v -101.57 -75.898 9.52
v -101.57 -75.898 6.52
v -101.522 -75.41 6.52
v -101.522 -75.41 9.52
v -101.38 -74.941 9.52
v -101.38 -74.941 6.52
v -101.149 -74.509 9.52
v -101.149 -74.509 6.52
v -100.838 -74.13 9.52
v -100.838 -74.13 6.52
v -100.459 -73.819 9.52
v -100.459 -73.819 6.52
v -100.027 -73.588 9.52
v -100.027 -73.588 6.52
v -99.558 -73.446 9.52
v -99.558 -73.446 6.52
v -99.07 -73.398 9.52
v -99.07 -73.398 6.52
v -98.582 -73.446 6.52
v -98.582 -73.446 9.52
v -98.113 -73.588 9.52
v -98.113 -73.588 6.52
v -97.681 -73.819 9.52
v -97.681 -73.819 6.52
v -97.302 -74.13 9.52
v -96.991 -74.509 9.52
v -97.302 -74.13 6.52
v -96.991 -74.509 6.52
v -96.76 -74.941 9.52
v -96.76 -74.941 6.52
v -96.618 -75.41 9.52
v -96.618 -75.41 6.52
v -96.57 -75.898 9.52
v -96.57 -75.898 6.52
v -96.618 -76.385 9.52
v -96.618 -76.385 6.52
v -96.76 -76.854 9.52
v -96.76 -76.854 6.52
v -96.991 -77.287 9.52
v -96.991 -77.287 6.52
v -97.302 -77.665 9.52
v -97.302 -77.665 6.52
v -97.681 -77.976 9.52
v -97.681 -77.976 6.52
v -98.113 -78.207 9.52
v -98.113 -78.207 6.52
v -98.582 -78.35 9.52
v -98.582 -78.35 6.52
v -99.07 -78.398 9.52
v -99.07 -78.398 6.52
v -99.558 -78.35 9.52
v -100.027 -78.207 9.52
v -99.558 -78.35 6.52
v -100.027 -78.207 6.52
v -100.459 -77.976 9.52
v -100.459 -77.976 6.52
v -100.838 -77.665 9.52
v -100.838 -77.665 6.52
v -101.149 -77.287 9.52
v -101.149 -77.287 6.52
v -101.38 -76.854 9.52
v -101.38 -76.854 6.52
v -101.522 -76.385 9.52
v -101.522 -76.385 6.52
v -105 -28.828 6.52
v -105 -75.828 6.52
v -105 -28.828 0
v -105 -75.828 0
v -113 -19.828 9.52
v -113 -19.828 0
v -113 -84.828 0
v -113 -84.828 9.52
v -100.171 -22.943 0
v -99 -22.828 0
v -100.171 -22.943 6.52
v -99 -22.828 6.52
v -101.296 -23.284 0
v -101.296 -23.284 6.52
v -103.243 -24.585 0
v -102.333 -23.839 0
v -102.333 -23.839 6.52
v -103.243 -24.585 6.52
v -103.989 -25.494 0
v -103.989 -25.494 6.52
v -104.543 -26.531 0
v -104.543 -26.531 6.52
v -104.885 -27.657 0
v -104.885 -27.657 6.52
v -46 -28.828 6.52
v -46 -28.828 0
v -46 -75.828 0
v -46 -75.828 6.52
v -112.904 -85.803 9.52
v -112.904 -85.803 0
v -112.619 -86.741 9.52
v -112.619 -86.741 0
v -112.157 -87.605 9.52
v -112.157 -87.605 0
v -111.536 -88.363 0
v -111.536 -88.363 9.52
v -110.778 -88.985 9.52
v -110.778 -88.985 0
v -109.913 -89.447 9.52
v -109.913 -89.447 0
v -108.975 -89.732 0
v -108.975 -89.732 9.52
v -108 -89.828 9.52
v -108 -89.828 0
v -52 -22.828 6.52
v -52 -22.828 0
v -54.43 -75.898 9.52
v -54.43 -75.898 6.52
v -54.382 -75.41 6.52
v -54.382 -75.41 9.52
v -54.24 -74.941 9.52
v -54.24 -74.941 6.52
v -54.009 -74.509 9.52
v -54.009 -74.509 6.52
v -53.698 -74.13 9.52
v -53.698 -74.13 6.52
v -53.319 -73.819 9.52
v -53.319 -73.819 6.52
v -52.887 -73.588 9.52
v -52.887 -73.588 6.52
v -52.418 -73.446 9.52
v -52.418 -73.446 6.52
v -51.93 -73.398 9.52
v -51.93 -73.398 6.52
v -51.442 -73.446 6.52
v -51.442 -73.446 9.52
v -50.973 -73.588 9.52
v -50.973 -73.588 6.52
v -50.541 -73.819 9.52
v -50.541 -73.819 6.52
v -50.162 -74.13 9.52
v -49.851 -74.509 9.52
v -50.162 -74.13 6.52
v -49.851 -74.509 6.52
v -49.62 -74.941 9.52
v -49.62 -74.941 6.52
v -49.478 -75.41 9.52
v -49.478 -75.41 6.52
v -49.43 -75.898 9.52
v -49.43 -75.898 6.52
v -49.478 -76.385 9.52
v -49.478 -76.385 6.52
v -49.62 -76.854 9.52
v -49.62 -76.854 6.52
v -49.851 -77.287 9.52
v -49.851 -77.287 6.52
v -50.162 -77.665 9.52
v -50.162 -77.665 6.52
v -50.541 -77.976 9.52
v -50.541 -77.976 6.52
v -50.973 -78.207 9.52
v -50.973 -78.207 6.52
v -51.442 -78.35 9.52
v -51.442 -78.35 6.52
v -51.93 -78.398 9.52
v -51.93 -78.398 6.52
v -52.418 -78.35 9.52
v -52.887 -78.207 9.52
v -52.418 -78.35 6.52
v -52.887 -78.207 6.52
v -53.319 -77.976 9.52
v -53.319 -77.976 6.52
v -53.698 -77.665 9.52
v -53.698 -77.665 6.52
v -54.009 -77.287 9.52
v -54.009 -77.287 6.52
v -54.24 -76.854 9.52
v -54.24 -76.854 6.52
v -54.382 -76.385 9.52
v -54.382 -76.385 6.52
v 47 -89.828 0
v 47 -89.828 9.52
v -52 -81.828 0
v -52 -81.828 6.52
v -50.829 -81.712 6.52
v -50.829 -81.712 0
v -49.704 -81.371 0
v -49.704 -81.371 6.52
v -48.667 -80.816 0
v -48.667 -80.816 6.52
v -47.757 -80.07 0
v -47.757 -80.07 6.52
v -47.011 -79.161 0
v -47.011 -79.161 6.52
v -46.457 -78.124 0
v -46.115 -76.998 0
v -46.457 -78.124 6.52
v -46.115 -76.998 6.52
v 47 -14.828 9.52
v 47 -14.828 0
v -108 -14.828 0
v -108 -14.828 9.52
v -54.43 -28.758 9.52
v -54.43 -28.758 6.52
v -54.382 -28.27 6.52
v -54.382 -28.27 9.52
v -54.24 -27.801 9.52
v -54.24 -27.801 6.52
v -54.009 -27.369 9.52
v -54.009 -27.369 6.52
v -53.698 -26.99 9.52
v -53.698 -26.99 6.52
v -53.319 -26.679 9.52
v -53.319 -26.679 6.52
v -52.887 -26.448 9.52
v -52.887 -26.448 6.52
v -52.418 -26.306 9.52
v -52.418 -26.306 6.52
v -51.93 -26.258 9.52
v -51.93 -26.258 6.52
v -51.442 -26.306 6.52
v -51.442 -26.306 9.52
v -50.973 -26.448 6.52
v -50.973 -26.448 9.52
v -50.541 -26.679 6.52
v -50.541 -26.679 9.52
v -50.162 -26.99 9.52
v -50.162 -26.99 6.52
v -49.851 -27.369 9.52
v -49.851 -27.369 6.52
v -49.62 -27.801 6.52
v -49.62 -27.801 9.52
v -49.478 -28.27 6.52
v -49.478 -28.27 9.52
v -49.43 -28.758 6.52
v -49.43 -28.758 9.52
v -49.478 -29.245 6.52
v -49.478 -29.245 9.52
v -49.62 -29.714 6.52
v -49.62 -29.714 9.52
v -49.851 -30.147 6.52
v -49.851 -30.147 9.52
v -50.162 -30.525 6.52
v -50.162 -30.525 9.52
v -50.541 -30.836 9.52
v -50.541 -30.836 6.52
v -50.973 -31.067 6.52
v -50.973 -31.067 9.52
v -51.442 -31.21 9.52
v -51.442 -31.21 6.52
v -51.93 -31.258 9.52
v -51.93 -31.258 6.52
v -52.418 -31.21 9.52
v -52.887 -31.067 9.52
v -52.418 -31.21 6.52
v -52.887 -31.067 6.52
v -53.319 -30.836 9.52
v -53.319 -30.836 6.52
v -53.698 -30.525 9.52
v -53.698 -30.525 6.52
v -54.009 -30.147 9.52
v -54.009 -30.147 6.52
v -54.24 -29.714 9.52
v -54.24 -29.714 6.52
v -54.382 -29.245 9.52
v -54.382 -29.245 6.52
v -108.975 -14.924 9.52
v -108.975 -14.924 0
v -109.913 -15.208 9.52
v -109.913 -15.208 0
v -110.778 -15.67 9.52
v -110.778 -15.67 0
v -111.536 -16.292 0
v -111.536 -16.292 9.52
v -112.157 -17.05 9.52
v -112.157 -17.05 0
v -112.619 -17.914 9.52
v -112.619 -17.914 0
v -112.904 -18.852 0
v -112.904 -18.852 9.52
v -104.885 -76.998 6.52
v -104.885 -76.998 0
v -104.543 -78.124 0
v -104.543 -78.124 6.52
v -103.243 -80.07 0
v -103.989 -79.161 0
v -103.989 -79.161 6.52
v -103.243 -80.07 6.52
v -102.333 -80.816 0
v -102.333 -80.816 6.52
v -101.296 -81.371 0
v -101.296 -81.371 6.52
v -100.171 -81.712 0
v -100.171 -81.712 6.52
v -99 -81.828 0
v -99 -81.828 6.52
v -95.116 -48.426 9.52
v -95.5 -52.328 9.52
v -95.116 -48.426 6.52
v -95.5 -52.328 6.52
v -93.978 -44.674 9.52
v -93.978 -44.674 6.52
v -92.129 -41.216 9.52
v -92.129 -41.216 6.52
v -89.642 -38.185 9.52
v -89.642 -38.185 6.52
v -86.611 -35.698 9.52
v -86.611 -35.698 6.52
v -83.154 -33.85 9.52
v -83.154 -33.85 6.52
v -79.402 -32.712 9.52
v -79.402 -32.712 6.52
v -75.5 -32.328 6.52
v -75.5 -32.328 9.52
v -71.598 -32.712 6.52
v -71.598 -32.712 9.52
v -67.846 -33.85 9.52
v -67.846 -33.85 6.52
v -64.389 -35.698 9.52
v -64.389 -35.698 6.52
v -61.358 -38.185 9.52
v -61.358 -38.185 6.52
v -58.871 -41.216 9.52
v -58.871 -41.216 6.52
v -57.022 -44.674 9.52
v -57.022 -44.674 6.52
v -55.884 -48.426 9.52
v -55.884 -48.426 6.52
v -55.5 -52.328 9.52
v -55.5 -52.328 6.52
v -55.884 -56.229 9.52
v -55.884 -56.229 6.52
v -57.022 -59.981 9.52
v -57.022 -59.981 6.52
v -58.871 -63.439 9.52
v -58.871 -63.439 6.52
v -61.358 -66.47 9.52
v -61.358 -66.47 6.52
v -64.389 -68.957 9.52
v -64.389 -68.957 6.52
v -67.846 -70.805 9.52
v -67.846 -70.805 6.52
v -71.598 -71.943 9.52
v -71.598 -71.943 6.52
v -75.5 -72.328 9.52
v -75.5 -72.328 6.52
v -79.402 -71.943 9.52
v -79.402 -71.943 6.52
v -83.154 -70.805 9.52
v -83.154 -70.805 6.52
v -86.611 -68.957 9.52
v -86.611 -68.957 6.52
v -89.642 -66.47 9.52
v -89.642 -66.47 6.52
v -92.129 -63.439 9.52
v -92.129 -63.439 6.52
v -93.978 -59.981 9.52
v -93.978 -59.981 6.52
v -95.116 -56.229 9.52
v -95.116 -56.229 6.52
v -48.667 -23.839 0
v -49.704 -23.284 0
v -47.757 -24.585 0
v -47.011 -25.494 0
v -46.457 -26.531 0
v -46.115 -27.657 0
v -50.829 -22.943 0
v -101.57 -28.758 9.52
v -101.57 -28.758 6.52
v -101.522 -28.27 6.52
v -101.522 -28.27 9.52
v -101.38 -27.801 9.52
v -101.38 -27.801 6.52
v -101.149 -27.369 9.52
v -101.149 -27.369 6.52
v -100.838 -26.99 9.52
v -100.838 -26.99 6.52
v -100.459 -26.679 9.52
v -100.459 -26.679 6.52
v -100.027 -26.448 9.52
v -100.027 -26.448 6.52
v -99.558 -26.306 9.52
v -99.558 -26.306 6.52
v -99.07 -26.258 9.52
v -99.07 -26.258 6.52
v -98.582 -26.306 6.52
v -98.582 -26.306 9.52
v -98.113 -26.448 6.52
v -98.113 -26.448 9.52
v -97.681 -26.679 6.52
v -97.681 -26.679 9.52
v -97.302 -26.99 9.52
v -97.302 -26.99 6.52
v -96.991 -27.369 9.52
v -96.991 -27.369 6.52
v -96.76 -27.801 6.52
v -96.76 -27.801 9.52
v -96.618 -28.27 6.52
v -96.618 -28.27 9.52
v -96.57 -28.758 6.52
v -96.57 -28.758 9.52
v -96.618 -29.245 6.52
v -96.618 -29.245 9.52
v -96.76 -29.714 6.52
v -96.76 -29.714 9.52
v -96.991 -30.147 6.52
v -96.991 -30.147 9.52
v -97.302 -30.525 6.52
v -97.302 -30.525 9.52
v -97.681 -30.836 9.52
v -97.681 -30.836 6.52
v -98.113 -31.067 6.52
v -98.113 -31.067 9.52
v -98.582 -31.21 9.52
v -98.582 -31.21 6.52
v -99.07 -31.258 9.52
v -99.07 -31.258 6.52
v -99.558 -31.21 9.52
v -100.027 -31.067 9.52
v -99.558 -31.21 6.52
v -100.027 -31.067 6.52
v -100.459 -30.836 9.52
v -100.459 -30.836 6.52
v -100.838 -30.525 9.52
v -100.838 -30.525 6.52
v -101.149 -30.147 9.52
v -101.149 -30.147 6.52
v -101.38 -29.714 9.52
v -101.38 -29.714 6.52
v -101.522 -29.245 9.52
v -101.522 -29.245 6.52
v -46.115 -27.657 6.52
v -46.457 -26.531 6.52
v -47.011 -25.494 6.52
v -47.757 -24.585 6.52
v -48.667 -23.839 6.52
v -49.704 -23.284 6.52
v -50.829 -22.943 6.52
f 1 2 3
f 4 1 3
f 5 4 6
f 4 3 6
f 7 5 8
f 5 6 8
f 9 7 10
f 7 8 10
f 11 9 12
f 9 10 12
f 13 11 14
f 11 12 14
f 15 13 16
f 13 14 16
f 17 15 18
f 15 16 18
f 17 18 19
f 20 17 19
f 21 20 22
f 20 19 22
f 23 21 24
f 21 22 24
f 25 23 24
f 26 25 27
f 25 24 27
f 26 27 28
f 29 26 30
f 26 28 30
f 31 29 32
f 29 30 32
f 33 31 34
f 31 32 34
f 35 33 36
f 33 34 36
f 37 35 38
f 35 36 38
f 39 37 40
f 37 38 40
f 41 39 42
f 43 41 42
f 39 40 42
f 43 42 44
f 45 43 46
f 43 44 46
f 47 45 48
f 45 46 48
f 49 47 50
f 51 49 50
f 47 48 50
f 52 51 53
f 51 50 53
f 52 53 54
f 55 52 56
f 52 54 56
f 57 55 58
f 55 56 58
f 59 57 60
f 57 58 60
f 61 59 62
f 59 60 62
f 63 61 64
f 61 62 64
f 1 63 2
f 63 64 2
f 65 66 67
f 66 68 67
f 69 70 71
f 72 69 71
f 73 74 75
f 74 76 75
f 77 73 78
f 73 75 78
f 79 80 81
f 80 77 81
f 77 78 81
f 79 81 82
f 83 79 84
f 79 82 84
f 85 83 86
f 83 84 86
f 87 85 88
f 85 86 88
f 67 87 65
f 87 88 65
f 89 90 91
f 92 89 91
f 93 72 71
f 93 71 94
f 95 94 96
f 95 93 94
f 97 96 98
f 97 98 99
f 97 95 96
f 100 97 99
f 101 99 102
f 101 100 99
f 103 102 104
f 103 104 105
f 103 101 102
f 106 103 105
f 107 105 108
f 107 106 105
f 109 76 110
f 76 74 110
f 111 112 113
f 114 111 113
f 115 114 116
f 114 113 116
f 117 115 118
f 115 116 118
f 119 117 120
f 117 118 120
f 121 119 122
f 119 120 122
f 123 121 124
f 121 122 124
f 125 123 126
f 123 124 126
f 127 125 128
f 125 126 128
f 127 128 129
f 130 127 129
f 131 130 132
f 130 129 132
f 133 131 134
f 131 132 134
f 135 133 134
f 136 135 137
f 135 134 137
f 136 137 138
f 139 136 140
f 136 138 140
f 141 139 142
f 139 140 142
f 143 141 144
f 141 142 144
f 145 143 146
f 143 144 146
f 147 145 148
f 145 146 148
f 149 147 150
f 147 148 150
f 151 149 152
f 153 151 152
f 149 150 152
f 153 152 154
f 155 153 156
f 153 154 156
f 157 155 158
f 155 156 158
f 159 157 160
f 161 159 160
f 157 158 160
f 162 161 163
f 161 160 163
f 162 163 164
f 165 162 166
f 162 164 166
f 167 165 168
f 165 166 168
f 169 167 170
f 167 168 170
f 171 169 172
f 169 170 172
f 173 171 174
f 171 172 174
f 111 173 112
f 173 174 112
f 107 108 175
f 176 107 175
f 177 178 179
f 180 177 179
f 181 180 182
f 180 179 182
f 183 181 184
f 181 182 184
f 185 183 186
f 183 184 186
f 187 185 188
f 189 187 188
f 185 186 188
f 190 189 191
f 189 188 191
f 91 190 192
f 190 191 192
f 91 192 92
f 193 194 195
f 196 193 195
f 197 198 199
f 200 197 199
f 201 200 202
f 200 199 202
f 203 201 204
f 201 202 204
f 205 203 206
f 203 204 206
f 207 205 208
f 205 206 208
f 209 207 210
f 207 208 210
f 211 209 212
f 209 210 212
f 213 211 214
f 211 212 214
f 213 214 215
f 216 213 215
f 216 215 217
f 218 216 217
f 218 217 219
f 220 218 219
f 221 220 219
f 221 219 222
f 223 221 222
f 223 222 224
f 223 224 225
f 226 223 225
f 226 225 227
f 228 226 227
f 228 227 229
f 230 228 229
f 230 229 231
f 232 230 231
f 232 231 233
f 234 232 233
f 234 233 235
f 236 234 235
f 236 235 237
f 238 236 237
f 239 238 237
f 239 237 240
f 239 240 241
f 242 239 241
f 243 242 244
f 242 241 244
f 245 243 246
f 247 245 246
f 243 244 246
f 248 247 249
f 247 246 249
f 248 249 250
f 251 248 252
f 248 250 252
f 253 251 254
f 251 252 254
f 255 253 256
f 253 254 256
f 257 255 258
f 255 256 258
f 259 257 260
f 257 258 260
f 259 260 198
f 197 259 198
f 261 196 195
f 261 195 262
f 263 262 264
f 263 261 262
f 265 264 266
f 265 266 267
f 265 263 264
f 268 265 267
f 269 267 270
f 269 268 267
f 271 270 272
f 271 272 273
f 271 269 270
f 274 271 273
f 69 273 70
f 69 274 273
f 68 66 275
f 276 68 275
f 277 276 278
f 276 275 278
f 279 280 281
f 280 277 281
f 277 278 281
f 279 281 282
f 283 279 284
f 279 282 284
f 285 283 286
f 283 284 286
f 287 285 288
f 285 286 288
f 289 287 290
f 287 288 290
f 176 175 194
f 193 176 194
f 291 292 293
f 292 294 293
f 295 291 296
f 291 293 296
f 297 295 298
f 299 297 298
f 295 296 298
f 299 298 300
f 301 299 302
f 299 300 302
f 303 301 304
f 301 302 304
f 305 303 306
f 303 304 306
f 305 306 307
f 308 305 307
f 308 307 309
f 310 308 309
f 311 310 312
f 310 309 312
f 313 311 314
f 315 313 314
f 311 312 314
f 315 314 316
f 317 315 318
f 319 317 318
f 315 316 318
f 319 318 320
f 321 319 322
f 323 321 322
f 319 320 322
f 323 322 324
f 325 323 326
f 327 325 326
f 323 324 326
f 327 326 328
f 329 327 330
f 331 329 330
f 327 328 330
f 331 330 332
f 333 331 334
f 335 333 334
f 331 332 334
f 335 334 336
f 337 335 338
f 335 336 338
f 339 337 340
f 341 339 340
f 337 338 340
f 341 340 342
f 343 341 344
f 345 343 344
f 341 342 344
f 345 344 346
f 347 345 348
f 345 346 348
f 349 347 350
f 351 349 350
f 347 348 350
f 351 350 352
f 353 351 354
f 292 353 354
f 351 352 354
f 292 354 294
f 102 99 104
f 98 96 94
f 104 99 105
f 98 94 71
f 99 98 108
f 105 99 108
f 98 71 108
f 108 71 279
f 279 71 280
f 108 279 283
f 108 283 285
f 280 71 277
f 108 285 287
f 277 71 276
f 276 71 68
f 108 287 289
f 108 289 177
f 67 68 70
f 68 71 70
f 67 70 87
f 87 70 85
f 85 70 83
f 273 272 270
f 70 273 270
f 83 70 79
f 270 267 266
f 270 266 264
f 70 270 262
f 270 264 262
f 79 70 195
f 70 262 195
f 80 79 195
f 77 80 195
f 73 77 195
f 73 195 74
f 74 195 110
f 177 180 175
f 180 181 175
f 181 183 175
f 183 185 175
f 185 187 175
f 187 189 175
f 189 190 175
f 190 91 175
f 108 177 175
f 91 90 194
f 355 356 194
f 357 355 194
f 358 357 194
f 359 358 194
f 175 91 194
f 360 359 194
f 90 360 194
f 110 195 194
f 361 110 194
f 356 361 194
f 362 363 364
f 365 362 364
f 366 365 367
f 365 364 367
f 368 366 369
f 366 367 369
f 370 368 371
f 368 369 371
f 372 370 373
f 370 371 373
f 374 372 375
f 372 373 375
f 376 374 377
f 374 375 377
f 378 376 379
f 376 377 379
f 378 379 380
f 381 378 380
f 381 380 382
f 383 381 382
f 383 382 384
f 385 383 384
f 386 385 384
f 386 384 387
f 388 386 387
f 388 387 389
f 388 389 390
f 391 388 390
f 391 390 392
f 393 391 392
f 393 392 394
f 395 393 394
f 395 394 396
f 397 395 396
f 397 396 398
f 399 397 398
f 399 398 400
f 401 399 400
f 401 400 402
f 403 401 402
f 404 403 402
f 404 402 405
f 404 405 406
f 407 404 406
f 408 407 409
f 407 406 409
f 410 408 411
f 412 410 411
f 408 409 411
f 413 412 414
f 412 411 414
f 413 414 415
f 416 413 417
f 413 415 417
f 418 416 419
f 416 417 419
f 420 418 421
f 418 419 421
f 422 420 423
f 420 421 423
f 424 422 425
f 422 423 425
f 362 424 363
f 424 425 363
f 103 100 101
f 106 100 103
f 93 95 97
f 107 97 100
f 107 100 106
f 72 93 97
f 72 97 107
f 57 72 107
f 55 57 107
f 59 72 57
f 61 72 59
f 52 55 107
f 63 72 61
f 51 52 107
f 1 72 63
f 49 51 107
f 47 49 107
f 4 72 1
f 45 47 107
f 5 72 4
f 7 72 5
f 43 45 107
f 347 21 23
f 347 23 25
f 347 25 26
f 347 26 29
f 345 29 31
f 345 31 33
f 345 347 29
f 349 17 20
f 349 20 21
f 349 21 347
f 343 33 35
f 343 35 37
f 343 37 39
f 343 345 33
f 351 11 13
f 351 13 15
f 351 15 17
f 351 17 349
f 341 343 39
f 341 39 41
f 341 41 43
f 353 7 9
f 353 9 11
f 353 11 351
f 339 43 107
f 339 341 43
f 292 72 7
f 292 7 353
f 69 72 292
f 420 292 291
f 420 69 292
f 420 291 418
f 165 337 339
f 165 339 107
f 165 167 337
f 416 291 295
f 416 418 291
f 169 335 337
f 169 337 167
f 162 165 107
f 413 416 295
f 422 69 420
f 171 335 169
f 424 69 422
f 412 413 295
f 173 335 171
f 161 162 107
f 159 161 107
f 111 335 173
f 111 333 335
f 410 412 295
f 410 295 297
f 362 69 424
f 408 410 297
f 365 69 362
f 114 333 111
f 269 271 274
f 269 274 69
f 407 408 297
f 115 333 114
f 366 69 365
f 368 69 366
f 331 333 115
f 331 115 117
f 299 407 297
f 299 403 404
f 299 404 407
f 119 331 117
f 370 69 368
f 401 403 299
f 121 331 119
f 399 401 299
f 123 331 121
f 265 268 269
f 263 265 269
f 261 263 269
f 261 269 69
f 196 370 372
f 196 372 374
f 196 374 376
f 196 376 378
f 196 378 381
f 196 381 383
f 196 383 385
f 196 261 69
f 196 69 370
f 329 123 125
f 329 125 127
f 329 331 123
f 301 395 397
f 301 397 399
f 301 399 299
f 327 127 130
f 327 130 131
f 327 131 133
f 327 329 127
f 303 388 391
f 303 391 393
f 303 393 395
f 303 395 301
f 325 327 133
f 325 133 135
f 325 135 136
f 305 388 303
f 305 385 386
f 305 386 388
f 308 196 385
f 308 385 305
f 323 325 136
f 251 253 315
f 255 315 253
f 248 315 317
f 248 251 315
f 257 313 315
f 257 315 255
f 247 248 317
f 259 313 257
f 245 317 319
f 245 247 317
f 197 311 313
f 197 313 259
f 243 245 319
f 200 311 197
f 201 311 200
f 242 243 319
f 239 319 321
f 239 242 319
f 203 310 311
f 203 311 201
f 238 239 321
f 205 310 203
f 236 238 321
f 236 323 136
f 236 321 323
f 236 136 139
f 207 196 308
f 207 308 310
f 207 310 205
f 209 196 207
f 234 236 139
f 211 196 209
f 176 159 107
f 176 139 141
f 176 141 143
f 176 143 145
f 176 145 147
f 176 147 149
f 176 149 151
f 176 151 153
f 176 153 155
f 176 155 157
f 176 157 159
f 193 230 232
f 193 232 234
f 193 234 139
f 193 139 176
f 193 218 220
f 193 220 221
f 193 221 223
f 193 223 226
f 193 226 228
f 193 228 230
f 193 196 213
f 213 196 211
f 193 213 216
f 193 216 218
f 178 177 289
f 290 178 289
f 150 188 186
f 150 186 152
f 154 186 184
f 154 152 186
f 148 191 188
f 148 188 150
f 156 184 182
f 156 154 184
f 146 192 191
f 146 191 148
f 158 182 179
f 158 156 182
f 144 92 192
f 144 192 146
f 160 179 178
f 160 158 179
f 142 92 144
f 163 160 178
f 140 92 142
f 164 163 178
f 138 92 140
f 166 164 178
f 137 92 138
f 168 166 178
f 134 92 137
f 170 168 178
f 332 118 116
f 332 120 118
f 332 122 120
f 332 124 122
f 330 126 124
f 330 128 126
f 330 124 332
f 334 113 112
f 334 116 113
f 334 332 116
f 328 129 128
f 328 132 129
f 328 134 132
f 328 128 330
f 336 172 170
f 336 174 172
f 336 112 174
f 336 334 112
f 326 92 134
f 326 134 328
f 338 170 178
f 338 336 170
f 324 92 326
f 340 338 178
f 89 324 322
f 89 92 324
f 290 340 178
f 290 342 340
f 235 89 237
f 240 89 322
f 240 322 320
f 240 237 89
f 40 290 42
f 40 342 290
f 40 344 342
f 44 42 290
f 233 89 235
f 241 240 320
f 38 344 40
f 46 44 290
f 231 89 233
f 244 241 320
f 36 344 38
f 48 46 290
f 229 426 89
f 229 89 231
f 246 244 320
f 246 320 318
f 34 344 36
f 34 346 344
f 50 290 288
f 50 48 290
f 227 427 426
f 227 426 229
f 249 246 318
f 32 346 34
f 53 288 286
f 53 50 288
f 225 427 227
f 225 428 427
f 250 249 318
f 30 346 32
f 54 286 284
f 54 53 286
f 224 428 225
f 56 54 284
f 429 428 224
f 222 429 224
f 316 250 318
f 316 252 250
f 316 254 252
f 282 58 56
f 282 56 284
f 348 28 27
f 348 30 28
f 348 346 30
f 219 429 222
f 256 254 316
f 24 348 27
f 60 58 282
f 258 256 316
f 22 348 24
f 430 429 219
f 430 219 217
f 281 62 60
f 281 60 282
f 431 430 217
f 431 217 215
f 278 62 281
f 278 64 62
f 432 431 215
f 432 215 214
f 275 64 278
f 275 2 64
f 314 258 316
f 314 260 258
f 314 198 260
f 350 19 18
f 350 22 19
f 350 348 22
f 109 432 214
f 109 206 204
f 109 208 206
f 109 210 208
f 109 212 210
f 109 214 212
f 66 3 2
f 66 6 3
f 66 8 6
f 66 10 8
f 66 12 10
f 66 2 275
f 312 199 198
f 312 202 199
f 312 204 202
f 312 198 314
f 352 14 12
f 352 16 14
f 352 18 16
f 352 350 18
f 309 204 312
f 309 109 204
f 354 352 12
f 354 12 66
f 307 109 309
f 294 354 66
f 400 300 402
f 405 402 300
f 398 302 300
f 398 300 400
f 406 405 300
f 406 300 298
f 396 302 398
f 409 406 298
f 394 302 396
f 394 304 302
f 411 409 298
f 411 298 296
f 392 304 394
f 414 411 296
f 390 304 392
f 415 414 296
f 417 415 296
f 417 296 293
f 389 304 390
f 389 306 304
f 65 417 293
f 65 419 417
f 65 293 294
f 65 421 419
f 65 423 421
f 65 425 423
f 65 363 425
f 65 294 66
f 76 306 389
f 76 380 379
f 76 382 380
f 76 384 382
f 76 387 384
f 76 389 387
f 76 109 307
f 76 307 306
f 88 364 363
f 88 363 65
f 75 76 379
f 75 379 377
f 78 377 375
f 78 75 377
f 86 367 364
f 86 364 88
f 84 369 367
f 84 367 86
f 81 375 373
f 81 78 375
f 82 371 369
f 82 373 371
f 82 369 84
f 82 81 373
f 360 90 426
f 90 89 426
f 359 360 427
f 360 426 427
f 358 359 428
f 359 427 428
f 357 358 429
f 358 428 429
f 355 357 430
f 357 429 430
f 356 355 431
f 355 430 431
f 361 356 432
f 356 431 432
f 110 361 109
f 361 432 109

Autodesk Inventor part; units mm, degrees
ref_plane "YZ Plane" through (0, 0, 0) normal (1, 0, 0) x (0, 1, 0)
ref_plane "XZ Plane" through (0, 0, 0) normal (0, 1, 0) x (-1, 0, 0)
ref_plane "XY Plane" through (0, 0, 0) normal (0, 0, 1) x (1, 0, 0)
sketch "Esboço1" plane through (0, 0, 0) normal (0, 0, 1) x (1, 0, 0)
  line L0 (-33, -50) -> (-33, 950) projected
  line L1 (47, -50) -> (47, 950) projected
  line L2 (-113, -89.8276) -> (47, -89.8276)
  line L3 (47, -14.8276) -> (-113, -14.8276)
  line L4 (-113, -14.8276) -> (-113, -89.8276)
  line L5 (47, -89.8276) -> (47, -14.8276)
  point P0 (0, 0)
  dimension "d0" = 160
  dimension "d1" = 160
  dimension "d2" = 75
extrude "Extrusão1" add sketch "Esboço1" along normal blind 9.52
sketch "Esboço9" plane through (0, 0, 0) normal (0, 0, -1) x (-1, 0, 0)
  line L0 (105, -22.8276) -> (46, -22.8276)
  line L1 (46, -22.8276) -> (46, -81.8276)
  line L2 (46, -81.8276) -> (105, -81.8276)
  line L3 (105, -81.8276) -> (105, -22.8276)
  line L4 (105, -22.8276) -> (46, -81.8276) construction
  line L5 (46, -22.8276) -> (105, -81.8276) construction
  line L6 (105, -52.3276) -> (46, -52.3276) construction
  line L7 (75.5, -22.8276) -> (75.5, -81.8276) construction
  circle A0 centre (99.07, -28.7576) radius 2.5
  circle A1 centre (99.07, -75.8976) radius 2.5
  circle A2 centre (51.93, -28.7576) radius 2.5
  circle A3 centre (51.93, -75.8976) radius 2.5
  line L8 (113, -14.8276) -> (113, -89.8276) projected
  line L9 (113, -89.8276) -> (-47, -89.8276) projected
  circle A4 centre (75.5, -52.3276) radius 20
  point P0 (0, 0)
  dimension "d72" = 59
  dimension "d73" = 59
  dimension "d74" = 5
  dimension "d75" = 5
  dimension "d76" = 5
  dimension "d77" = 5
  dimension "d78" = 23.57
  dimension "d79" = 23.57
  dimension "d80" = 23.57
  dimension "d81" = 23.57
  dimension "d82" = 23.57
  dimension "d83" = 23.57
  dimension "d84" = 23.57
  dimension "d85" = 23.57
  dimension "d86" = 8
  dimension "d87" = 8
  dimension "d88" = 40
extrude "Extrusão6" cut sketch "Esboço9" against normal blind 6.52
sketch "Esboço10" plane through (-75.5, -52.3276, 0) normal (0, 0, -1) x (-1, 0, 0)
  circle A0 centre (0, 0) radius 20 projected
  circle A1 centre (0, 0) radius 20
  circle A2 centre (23.57, -23.57) radius 2.5 projected
  circle A3 centre (23.57, -23.57) radius 2.5
  circle A4 centre (23.57, 23.57) radius 2.5 projected
  circle A5 centre (23.57, 23.57) radius 2.5
  circle A6 centre (-23.57, 23.57) radius 2.5 projected
  circle A7 centre (-23.57, 23.57) radius 2.5
  circle A8 centre (-23.57, -23.57) radius 2.5 projected
  circle A9 centre (-23.57, -23.57) radius 2.5
  point P0 (-75.5, 52.3276)
extrude "Extrusão7" cut sketch "Esboço10" against normal through all
fillet "Arredondamento1" radius 6 4 edges at (-105, -22.8276, 3.26) (-105, -81.8276, 3.26) (-46, -22.8276, 3.26) (-46, -81.8276, 3.26)
fillet "Arredondamento2" radius 5 2 edges at (-113, -14.8276, 4.76) (-113, -89.8276, 4.76)
equation "\"d0\" = d1"
equation "\"d79\" = d78"
equation "\"d80\" = d78"
equation "\"d81\" = d78"
equation "\"d82\" = d78"
equation "\"d83\" = d78"
equation "\"d84\" = d78"
equation "\"d85\" = d78"
properties part number "SUPORTE_MOTOR_EIXO_X"
